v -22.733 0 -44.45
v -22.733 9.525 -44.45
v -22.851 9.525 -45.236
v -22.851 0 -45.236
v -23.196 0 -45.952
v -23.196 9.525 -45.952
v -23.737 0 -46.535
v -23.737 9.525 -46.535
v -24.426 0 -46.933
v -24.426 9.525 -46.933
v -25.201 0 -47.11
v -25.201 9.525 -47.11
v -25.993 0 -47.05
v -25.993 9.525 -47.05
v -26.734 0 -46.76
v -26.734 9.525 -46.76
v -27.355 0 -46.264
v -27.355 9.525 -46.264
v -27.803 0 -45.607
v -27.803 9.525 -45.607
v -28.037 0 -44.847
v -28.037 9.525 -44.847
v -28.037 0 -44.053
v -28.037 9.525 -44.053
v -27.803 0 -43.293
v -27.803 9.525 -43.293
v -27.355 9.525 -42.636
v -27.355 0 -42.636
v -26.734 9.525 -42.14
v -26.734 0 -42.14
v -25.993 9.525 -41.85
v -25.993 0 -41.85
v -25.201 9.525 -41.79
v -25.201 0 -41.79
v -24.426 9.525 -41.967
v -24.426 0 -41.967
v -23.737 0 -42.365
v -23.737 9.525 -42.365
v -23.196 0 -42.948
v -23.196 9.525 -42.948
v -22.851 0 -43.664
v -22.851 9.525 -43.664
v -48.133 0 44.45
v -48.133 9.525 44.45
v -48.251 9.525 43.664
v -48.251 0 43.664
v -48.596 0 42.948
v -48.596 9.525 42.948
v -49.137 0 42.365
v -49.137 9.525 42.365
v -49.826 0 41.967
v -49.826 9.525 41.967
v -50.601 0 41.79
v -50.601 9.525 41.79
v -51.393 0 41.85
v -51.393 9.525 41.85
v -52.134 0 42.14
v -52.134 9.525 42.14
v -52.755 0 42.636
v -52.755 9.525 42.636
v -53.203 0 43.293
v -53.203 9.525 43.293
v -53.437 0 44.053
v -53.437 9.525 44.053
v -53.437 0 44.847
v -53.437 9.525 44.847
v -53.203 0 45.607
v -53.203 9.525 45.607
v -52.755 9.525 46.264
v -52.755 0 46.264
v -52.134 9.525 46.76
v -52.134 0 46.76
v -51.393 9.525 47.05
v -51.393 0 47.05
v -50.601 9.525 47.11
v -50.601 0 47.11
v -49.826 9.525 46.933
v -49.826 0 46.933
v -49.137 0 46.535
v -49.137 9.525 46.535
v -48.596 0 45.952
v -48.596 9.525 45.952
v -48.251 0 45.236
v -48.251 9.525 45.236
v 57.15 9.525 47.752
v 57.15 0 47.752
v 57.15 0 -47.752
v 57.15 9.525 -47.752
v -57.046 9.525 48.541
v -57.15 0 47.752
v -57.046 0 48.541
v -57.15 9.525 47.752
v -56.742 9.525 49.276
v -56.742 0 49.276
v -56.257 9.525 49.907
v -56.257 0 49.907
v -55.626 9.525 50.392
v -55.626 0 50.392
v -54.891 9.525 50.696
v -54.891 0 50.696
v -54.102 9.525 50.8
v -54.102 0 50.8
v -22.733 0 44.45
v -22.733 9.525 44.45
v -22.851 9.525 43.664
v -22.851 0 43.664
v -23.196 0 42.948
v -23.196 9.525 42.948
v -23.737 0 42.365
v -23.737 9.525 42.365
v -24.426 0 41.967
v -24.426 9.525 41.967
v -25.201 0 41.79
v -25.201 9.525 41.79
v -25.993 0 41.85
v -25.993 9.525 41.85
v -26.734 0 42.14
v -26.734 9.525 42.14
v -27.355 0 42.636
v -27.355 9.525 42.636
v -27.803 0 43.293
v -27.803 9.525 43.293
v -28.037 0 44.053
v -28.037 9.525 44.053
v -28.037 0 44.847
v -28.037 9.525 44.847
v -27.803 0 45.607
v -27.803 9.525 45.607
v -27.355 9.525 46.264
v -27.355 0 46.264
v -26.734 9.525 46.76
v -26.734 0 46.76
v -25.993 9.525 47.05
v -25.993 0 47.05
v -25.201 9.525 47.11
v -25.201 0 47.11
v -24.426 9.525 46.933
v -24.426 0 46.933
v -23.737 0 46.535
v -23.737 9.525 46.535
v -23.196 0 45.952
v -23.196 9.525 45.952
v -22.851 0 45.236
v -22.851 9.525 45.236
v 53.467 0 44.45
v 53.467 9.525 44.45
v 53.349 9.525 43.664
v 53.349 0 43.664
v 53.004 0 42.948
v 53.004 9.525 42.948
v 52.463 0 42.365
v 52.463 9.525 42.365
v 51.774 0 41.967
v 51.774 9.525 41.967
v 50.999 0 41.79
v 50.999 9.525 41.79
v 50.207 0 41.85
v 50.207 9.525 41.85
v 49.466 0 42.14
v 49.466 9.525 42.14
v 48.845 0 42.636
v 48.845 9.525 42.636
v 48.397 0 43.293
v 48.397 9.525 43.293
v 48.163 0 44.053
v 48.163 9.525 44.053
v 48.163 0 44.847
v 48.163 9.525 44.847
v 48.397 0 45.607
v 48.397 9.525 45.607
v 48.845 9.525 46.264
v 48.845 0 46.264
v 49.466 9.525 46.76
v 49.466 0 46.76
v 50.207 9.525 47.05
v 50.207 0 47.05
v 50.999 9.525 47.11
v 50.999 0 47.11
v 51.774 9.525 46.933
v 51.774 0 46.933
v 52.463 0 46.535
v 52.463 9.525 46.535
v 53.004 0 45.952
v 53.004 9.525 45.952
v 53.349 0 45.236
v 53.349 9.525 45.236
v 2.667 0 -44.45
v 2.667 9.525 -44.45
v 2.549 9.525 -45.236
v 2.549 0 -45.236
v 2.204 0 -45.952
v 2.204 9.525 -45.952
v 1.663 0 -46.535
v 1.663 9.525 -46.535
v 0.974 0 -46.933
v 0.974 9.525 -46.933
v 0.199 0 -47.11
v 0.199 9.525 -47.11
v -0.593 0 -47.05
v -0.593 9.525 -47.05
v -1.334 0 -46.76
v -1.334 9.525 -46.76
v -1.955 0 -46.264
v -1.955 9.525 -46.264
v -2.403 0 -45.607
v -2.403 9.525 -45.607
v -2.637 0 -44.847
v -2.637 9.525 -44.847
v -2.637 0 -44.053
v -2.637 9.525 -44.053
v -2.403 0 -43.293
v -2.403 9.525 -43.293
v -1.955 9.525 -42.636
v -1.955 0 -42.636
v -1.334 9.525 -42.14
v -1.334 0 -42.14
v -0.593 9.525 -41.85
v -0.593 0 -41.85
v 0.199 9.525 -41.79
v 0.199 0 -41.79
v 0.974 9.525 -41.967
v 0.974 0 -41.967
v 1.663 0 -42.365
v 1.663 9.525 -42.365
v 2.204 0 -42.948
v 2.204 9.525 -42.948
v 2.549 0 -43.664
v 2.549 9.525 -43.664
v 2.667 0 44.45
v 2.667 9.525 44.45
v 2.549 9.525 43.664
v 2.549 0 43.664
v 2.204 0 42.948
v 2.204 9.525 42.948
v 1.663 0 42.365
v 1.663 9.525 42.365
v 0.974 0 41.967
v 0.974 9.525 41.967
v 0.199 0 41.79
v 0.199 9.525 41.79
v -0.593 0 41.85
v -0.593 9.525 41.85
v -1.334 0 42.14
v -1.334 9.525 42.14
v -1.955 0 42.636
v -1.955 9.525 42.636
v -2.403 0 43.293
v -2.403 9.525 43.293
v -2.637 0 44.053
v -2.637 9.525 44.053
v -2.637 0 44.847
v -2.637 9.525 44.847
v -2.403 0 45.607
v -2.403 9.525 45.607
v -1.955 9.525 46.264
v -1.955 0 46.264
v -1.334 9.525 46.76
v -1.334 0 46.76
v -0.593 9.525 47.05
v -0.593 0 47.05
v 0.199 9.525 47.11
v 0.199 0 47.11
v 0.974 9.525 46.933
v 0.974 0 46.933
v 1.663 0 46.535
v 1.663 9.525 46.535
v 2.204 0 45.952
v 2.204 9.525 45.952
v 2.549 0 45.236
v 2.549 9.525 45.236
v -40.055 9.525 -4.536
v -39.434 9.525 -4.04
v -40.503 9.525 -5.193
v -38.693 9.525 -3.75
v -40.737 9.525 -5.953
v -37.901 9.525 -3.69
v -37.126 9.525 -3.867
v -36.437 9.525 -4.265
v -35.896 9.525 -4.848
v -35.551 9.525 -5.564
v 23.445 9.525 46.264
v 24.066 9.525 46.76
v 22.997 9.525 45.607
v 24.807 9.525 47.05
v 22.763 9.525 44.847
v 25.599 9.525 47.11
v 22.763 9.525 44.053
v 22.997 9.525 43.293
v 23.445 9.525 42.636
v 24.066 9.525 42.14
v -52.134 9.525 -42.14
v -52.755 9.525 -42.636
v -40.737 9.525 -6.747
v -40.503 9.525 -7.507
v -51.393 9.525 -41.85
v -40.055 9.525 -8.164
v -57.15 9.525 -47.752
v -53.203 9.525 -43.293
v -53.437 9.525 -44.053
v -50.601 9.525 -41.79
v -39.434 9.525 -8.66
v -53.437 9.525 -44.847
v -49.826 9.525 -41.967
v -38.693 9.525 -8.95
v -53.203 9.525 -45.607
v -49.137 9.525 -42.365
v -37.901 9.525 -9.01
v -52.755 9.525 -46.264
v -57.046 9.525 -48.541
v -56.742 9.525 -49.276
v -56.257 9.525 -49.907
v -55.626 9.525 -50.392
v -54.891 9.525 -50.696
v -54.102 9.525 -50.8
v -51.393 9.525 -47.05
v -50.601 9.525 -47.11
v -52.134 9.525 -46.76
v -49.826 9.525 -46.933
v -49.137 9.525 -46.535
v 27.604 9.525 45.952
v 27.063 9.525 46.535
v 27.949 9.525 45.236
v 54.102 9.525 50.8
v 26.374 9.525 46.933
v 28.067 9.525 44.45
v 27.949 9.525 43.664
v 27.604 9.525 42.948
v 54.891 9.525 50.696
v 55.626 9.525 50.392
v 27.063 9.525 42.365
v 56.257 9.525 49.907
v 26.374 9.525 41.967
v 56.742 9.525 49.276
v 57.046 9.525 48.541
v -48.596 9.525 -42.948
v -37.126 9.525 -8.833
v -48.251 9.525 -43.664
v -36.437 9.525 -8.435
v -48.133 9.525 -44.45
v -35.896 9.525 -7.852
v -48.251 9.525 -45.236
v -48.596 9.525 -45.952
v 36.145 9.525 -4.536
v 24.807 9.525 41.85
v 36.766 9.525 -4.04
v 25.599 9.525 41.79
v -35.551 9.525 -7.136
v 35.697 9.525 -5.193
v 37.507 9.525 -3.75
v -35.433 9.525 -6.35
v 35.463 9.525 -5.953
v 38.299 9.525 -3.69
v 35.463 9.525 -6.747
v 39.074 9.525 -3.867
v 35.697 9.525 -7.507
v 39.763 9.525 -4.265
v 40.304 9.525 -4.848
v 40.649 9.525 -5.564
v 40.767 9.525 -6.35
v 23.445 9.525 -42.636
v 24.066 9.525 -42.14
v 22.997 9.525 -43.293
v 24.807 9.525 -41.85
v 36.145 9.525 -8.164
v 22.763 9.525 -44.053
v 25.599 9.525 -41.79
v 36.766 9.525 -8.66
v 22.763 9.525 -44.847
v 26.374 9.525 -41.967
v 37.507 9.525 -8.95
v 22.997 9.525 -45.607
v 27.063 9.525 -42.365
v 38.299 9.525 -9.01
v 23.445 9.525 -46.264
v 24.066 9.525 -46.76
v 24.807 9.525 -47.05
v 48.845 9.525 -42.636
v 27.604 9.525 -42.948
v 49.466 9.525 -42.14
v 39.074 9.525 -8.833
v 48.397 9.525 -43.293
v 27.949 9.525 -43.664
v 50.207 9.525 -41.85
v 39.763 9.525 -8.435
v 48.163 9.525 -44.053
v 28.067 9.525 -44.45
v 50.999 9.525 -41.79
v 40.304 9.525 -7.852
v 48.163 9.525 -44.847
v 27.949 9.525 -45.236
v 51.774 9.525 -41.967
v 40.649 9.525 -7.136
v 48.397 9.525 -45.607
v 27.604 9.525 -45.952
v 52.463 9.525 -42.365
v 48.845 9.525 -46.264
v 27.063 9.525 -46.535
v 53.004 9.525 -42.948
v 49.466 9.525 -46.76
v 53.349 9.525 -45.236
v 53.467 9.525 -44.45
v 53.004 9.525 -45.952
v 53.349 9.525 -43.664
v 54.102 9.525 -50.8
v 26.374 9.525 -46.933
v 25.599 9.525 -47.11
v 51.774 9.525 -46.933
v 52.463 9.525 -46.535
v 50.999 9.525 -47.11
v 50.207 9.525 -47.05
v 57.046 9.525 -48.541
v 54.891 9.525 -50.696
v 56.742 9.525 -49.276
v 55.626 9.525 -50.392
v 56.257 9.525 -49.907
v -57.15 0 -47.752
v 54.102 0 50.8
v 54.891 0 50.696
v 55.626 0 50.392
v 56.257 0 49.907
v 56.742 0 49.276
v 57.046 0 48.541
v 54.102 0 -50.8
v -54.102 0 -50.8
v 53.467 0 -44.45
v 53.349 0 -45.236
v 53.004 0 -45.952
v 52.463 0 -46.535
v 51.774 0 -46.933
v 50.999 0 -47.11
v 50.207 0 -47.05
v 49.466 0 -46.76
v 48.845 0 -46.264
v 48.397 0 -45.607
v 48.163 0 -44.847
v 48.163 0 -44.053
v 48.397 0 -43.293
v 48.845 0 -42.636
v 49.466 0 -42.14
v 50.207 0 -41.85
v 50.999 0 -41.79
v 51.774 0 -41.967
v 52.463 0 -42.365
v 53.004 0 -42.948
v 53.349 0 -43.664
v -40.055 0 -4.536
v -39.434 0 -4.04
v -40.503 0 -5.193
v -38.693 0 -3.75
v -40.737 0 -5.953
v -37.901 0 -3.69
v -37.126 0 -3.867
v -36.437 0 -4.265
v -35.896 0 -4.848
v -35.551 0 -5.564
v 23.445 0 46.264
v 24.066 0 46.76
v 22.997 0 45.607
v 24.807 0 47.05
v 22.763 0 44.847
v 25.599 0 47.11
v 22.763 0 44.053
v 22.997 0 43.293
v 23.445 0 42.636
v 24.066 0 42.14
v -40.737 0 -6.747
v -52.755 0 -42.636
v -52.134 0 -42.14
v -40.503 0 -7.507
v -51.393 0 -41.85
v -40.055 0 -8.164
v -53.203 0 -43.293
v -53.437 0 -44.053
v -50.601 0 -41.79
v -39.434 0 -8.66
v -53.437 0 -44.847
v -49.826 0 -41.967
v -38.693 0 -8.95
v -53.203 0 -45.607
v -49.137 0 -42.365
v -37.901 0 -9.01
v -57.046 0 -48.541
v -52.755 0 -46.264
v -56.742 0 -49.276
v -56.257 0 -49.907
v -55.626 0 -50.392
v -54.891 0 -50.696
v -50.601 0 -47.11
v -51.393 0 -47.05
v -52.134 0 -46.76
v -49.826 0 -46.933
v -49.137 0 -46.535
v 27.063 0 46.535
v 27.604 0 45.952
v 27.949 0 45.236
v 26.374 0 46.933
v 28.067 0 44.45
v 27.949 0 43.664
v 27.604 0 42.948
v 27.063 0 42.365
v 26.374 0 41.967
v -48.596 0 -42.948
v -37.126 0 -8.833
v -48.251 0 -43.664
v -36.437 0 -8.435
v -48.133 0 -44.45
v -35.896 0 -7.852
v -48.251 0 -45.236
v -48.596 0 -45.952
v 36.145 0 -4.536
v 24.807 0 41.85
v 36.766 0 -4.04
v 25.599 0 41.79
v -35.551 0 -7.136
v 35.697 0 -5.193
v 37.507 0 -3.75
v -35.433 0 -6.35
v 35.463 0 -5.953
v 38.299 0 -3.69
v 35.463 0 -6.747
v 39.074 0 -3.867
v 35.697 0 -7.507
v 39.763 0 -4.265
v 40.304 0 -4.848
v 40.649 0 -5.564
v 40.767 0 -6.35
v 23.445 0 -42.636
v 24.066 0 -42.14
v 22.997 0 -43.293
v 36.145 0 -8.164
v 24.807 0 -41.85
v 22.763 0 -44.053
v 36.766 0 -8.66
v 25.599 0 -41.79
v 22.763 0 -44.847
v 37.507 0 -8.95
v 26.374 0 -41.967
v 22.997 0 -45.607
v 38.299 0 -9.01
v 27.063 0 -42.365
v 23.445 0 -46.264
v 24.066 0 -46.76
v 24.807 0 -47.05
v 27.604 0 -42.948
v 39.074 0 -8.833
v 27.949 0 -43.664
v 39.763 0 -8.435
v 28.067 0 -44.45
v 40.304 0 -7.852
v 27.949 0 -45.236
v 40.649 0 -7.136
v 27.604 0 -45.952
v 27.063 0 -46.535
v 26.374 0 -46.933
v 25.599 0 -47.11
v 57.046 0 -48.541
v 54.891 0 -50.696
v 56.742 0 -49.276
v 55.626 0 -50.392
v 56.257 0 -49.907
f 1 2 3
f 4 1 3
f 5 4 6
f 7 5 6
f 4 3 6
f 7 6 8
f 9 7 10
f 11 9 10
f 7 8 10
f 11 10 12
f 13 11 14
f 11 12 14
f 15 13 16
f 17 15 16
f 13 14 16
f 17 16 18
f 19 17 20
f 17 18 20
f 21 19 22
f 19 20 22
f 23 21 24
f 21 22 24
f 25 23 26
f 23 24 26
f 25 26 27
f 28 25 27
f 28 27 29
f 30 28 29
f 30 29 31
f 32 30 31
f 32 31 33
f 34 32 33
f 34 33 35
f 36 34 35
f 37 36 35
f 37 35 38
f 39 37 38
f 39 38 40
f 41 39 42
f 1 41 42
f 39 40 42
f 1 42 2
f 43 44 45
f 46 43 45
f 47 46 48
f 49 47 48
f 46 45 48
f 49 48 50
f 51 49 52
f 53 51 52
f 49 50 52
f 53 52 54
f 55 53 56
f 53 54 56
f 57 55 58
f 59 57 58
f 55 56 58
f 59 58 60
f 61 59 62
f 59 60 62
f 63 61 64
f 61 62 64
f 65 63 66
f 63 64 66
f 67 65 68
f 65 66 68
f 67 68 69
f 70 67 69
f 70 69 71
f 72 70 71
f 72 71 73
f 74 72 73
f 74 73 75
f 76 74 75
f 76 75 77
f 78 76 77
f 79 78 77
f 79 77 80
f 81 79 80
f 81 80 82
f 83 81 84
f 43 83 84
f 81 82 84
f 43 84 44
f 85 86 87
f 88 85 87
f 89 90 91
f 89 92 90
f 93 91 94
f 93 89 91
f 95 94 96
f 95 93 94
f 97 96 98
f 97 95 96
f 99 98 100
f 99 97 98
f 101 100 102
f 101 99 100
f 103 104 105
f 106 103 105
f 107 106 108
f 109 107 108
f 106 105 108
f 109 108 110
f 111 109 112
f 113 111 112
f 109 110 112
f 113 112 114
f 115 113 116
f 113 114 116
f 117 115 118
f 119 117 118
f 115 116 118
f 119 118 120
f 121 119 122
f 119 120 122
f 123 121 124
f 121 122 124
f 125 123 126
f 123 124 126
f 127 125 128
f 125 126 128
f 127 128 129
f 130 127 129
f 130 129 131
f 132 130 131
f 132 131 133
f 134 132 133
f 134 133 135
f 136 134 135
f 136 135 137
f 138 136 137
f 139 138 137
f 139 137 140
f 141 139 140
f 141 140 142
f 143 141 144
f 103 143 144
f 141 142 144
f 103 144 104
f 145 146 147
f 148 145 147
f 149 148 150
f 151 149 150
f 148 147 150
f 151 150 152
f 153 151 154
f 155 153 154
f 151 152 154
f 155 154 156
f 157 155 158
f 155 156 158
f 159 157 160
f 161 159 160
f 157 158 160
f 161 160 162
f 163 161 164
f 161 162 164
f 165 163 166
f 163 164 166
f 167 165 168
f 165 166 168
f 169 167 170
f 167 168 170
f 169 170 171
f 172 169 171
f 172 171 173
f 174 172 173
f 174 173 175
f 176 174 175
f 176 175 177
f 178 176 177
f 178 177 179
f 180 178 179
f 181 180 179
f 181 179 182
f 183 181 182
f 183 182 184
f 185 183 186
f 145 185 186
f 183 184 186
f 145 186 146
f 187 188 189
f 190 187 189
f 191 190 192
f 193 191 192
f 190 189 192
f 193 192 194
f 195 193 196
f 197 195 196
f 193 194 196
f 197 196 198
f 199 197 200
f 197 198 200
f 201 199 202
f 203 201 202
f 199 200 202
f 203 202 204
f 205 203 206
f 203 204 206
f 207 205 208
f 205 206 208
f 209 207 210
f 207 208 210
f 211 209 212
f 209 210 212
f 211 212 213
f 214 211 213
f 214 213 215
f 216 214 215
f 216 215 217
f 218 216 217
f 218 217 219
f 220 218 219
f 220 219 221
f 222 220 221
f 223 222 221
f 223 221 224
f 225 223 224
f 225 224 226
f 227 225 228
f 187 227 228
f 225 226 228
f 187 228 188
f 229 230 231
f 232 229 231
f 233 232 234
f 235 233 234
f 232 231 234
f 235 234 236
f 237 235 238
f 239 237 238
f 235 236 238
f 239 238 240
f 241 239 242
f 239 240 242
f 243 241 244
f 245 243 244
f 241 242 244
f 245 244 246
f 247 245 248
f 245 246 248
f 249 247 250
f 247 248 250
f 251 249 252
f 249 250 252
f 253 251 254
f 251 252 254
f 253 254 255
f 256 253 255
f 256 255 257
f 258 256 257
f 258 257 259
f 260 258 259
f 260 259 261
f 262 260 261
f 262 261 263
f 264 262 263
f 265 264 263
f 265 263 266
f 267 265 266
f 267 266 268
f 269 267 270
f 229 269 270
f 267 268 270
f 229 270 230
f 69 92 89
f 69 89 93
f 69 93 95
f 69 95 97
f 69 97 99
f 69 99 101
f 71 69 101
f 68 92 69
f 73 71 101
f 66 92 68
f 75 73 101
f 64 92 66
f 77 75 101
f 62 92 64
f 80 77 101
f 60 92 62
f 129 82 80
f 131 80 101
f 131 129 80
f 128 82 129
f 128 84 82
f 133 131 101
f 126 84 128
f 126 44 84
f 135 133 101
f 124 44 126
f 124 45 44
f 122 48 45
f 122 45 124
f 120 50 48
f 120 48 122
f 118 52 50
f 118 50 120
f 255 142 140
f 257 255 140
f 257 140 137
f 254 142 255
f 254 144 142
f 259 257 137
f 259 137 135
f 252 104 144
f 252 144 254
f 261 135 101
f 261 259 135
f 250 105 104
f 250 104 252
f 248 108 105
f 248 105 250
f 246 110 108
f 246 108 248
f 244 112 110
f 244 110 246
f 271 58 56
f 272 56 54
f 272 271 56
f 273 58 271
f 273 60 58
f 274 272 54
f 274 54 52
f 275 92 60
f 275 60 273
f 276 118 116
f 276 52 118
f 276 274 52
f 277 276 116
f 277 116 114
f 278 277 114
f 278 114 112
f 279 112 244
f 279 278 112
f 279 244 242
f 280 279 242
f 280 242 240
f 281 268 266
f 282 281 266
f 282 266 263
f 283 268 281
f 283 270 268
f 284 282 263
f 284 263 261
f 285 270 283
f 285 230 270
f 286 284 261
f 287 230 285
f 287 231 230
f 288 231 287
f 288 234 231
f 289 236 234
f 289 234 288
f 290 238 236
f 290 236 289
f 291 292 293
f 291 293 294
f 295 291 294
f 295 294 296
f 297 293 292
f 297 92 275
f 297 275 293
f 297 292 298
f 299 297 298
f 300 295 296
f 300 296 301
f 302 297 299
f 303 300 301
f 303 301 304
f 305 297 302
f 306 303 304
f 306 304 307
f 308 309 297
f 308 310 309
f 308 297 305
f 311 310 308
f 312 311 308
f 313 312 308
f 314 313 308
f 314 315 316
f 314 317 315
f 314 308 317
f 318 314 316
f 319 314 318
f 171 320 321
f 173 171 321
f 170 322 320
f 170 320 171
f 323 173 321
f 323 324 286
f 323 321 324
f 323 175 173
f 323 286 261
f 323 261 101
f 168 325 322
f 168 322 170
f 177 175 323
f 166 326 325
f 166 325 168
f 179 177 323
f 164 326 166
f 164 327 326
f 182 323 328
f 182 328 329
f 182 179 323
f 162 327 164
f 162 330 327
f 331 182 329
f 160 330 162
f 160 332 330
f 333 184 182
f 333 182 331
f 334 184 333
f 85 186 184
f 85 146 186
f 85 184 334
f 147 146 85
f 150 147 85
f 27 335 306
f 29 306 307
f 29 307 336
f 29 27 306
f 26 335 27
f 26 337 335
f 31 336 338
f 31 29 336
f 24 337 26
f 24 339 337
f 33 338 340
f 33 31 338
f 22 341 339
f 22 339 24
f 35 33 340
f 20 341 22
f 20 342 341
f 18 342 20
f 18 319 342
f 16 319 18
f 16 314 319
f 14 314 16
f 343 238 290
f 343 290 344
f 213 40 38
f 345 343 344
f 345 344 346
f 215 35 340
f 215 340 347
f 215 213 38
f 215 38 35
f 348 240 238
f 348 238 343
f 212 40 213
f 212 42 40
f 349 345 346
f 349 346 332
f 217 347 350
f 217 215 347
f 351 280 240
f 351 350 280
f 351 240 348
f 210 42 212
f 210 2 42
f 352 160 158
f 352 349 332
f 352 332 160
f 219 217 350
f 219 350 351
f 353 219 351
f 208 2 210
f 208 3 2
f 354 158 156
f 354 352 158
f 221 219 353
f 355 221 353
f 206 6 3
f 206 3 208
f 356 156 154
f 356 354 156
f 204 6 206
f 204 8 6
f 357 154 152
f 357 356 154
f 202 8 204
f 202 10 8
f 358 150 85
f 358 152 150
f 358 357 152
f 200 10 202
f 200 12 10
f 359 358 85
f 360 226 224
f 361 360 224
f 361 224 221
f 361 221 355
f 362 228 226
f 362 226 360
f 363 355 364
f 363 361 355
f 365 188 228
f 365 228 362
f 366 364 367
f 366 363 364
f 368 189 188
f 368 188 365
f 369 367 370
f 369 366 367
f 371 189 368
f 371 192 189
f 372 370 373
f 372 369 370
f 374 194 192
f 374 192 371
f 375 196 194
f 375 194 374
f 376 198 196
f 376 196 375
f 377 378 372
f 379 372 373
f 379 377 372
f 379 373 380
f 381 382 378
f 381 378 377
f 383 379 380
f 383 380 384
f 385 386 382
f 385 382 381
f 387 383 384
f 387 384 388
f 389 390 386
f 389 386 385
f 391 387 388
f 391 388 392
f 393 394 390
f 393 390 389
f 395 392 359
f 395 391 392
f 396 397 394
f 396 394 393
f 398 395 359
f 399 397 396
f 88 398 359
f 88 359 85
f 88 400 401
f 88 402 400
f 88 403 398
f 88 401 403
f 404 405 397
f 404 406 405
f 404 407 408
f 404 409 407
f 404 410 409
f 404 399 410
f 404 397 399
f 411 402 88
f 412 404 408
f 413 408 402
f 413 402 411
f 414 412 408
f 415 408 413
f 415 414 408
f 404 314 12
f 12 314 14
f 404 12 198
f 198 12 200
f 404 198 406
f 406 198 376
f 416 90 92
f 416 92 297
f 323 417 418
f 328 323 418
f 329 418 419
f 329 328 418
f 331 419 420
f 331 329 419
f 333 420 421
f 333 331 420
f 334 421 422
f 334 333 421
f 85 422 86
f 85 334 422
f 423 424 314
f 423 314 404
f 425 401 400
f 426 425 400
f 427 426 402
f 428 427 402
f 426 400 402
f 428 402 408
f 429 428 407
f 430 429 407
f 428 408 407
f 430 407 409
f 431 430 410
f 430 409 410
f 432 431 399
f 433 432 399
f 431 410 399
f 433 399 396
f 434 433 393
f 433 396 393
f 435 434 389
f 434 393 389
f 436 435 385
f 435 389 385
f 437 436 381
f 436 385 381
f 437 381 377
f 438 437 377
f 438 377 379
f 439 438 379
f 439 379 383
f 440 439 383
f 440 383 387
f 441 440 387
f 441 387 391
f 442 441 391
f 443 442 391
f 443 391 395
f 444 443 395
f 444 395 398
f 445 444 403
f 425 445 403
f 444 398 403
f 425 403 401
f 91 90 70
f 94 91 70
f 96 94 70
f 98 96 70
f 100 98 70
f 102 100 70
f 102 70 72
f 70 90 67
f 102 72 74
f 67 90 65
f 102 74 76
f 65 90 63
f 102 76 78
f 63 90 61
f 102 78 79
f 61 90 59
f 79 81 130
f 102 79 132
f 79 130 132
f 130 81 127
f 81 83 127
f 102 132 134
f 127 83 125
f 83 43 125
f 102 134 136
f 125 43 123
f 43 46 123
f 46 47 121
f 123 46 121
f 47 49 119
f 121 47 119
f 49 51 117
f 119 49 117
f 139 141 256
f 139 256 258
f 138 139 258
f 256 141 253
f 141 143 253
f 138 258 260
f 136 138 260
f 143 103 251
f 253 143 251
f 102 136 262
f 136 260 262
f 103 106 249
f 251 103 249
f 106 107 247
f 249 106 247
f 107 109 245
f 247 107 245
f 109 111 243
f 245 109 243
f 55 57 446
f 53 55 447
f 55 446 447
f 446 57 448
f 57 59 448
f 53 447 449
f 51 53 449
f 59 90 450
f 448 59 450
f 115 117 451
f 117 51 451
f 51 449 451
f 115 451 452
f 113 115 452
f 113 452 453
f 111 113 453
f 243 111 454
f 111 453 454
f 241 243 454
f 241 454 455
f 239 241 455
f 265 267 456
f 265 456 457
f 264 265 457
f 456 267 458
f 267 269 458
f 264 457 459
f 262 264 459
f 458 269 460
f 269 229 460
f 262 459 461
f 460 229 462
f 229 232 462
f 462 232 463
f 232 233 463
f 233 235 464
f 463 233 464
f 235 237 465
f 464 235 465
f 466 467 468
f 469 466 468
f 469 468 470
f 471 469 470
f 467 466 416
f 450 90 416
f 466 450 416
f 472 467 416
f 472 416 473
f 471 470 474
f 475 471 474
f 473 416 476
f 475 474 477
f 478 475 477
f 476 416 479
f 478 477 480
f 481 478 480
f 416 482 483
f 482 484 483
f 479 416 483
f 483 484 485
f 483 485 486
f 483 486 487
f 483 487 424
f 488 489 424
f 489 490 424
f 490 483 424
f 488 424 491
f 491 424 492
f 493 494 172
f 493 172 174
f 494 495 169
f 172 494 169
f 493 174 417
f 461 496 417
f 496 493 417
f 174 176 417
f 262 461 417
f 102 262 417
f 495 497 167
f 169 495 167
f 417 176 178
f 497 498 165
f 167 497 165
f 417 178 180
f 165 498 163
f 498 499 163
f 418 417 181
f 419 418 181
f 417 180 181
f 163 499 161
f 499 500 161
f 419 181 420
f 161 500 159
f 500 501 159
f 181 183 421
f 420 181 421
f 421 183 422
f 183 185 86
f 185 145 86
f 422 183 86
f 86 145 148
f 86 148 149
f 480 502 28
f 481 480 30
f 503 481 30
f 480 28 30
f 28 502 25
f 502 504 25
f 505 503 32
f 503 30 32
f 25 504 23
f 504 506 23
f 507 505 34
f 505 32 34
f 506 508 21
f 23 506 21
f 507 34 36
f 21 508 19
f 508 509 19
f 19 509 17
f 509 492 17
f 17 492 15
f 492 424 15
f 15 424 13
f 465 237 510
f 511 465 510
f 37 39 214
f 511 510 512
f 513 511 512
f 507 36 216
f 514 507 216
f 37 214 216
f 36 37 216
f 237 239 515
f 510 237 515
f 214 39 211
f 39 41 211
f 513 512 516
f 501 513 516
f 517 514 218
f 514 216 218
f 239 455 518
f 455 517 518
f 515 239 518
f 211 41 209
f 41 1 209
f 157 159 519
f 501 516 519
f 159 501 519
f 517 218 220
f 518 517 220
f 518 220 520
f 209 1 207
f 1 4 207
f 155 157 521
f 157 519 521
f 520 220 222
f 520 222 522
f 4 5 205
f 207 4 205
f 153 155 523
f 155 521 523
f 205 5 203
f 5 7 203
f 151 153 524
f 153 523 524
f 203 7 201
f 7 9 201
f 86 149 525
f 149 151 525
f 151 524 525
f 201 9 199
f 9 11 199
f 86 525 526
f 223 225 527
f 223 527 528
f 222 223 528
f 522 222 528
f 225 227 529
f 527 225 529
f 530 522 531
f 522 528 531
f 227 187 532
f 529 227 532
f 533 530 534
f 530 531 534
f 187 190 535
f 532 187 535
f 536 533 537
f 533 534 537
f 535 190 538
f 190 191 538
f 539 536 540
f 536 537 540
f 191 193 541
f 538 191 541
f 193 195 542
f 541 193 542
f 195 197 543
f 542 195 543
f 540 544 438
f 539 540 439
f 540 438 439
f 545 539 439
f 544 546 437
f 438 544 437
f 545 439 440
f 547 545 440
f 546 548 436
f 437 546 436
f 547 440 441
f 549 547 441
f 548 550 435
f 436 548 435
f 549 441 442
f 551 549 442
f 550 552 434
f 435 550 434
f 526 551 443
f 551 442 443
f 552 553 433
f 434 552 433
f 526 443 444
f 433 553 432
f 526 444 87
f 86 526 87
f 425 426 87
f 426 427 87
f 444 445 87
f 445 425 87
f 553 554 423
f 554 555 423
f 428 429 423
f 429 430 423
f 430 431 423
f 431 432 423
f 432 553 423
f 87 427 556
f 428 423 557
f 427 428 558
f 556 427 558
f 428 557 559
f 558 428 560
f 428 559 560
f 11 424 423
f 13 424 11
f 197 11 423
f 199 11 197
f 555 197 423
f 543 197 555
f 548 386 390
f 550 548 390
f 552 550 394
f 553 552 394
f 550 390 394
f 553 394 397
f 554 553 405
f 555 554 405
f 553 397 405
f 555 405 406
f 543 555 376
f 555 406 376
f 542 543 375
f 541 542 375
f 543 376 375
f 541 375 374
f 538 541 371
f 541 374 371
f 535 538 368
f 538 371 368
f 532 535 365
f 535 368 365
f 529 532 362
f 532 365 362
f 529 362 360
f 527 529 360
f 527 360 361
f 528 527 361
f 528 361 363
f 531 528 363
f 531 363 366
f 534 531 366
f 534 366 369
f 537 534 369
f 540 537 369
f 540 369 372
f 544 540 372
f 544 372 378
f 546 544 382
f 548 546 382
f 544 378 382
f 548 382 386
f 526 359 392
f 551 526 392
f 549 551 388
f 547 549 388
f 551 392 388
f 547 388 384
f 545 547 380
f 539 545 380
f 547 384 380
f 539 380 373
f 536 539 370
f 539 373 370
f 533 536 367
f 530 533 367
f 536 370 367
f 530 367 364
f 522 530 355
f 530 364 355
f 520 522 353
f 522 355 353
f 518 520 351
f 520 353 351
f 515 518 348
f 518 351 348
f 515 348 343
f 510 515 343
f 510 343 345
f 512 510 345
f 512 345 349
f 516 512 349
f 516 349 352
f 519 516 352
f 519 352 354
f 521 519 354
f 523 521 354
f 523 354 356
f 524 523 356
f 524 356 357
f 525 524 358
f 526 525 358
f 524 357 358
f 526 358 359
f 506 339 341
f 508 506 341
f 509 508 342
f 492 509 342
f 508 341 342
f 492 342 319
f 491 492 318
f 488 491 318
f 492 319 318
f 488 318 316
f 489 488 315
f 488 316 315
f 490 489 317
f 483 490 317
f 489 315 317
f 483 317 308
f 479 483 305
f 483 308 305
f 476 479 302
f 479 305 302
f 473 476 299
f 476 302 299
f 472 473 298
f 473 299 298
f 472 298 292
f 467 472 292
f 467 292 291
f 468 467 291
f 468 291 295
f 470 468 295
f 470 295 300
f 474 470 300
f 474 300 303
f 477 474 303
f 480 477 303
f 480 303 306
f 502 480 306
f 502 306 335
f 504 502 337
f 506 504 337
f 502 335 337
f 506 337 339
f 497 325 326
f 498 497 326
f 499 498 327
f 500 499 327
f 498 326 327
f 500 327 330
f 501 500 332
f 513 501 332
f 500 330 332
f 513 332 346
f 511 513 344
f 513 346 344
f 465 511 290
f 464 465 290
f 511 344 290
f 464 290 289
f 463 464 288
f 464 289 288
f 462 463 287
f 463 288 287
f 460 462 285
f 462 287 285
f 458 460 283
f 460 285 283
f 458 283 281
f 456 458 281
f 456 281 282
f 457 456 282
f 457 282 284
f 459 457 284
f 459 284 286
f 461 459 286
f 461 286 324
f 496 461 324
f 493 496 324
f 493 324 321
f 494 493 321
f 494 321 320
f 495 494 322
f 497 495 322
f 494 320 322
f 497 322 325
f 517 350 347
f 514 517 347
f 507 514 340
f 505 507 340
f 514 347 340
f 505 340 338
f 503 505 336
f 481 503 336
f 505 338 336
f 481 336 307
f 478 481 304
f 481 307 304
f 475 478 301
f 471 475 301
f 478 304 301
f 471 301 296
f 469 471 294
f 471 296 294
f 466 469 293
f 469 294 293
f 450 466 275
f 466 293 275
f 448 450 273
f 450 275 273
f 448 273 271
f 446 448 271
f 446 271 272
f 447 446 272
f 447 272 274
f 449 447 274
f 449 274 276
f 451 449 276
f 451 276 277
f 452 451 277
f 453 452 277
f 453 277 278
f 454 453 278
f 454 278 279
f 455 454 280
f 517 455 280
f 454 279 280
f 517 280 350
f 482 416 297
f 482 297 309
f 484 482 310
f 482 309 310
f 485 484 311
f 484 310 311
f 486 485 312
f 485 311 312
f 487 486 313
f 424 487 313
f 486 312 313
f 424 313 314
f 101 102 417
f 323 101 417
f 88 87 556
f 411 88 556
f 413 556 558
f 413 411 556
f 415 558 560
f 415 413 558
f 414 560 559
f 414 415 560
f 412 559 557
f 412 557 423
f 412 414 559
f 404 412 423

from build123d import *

# Parameters (mm, degrees)
SKETCH1_W           = 114.3
SKETCH1_H           = 101.6
BOSS_EXTRUDE1_DEPTH = 9.525
FILLET1_R           = 3.048
SKETCH3_R           = 2.667
CUT_EXTRUDE1_DEPTH  = 9.525


with BuildPart() as part:
    # Sketch1 → Boss-Extrude1 (new body)
    with BuildSketch(Plane(origin=(0, 0, 0), x_dir=(1, 0, 0), z_dir=(0, 1, 0))):
        Rectangle(SKETCH1_W, SKETCH1_H)
    extrude(amount=BOSS_EXTRUDE1_DEPTH)

    # Fillet1
    fillet1_edges = [part.edges().sort_by_distance(p)[0] for p in [
        (-57.15, 4.7625, -50.8),
        (57.15, 4.7625, -50.8),
        (57.15, 4.7625, 50.8),
        (-57.15, 4.7625, 50.8),
    ]]
    fillet(fillet1_edges, radius=FILLET1_R)

    # Sketch3 → Cut-Extrude1 (cut)
    with BuildSketch(Plane(origin=(0, 9.525, 0), x_dir=(1, 0, 0), z_dir=(0, 1, 0))):
        with Locations((50.8, 44.45)):
            Circle(SKETCH3_R)
        with Locations((25.4, 44.45)):
            Circle(SKETCH3_R)
        with Locations((0, 44.45)):
            Circle(SKETCH3_R)
        with Locations((-25.4, 44.45)):
            Circle(SKETCH3_R)
        with Locations((-50.8, 44.45)):
            Circle(SKETCH3_R)
        with Locations((25.4, -44.45)):
            Circle(SKETCH3_R)
        with Locations((0, -44.45)):
            Circle(SKETCH3_R)
        with Locations((-25.4, -44.45)):
            Circle(SKETCH3_R)
        with Locations((-50.8, -44.45)):
            Circle(SKETCH3_R)
        with Locations((50.8, -44.45)):
            Circle(SKETCH3_R)
        with Locations((38.1, 6.35)):
            Circle(SKETCH3_R)
        with Locations((-38.1, 6.35)):
            Circle(SKETCH3_R)
    extrude(amount=-CUT_EXTRUDE1_DEPTH, mode=Mode.SUBTRACT)


solid = part.part
